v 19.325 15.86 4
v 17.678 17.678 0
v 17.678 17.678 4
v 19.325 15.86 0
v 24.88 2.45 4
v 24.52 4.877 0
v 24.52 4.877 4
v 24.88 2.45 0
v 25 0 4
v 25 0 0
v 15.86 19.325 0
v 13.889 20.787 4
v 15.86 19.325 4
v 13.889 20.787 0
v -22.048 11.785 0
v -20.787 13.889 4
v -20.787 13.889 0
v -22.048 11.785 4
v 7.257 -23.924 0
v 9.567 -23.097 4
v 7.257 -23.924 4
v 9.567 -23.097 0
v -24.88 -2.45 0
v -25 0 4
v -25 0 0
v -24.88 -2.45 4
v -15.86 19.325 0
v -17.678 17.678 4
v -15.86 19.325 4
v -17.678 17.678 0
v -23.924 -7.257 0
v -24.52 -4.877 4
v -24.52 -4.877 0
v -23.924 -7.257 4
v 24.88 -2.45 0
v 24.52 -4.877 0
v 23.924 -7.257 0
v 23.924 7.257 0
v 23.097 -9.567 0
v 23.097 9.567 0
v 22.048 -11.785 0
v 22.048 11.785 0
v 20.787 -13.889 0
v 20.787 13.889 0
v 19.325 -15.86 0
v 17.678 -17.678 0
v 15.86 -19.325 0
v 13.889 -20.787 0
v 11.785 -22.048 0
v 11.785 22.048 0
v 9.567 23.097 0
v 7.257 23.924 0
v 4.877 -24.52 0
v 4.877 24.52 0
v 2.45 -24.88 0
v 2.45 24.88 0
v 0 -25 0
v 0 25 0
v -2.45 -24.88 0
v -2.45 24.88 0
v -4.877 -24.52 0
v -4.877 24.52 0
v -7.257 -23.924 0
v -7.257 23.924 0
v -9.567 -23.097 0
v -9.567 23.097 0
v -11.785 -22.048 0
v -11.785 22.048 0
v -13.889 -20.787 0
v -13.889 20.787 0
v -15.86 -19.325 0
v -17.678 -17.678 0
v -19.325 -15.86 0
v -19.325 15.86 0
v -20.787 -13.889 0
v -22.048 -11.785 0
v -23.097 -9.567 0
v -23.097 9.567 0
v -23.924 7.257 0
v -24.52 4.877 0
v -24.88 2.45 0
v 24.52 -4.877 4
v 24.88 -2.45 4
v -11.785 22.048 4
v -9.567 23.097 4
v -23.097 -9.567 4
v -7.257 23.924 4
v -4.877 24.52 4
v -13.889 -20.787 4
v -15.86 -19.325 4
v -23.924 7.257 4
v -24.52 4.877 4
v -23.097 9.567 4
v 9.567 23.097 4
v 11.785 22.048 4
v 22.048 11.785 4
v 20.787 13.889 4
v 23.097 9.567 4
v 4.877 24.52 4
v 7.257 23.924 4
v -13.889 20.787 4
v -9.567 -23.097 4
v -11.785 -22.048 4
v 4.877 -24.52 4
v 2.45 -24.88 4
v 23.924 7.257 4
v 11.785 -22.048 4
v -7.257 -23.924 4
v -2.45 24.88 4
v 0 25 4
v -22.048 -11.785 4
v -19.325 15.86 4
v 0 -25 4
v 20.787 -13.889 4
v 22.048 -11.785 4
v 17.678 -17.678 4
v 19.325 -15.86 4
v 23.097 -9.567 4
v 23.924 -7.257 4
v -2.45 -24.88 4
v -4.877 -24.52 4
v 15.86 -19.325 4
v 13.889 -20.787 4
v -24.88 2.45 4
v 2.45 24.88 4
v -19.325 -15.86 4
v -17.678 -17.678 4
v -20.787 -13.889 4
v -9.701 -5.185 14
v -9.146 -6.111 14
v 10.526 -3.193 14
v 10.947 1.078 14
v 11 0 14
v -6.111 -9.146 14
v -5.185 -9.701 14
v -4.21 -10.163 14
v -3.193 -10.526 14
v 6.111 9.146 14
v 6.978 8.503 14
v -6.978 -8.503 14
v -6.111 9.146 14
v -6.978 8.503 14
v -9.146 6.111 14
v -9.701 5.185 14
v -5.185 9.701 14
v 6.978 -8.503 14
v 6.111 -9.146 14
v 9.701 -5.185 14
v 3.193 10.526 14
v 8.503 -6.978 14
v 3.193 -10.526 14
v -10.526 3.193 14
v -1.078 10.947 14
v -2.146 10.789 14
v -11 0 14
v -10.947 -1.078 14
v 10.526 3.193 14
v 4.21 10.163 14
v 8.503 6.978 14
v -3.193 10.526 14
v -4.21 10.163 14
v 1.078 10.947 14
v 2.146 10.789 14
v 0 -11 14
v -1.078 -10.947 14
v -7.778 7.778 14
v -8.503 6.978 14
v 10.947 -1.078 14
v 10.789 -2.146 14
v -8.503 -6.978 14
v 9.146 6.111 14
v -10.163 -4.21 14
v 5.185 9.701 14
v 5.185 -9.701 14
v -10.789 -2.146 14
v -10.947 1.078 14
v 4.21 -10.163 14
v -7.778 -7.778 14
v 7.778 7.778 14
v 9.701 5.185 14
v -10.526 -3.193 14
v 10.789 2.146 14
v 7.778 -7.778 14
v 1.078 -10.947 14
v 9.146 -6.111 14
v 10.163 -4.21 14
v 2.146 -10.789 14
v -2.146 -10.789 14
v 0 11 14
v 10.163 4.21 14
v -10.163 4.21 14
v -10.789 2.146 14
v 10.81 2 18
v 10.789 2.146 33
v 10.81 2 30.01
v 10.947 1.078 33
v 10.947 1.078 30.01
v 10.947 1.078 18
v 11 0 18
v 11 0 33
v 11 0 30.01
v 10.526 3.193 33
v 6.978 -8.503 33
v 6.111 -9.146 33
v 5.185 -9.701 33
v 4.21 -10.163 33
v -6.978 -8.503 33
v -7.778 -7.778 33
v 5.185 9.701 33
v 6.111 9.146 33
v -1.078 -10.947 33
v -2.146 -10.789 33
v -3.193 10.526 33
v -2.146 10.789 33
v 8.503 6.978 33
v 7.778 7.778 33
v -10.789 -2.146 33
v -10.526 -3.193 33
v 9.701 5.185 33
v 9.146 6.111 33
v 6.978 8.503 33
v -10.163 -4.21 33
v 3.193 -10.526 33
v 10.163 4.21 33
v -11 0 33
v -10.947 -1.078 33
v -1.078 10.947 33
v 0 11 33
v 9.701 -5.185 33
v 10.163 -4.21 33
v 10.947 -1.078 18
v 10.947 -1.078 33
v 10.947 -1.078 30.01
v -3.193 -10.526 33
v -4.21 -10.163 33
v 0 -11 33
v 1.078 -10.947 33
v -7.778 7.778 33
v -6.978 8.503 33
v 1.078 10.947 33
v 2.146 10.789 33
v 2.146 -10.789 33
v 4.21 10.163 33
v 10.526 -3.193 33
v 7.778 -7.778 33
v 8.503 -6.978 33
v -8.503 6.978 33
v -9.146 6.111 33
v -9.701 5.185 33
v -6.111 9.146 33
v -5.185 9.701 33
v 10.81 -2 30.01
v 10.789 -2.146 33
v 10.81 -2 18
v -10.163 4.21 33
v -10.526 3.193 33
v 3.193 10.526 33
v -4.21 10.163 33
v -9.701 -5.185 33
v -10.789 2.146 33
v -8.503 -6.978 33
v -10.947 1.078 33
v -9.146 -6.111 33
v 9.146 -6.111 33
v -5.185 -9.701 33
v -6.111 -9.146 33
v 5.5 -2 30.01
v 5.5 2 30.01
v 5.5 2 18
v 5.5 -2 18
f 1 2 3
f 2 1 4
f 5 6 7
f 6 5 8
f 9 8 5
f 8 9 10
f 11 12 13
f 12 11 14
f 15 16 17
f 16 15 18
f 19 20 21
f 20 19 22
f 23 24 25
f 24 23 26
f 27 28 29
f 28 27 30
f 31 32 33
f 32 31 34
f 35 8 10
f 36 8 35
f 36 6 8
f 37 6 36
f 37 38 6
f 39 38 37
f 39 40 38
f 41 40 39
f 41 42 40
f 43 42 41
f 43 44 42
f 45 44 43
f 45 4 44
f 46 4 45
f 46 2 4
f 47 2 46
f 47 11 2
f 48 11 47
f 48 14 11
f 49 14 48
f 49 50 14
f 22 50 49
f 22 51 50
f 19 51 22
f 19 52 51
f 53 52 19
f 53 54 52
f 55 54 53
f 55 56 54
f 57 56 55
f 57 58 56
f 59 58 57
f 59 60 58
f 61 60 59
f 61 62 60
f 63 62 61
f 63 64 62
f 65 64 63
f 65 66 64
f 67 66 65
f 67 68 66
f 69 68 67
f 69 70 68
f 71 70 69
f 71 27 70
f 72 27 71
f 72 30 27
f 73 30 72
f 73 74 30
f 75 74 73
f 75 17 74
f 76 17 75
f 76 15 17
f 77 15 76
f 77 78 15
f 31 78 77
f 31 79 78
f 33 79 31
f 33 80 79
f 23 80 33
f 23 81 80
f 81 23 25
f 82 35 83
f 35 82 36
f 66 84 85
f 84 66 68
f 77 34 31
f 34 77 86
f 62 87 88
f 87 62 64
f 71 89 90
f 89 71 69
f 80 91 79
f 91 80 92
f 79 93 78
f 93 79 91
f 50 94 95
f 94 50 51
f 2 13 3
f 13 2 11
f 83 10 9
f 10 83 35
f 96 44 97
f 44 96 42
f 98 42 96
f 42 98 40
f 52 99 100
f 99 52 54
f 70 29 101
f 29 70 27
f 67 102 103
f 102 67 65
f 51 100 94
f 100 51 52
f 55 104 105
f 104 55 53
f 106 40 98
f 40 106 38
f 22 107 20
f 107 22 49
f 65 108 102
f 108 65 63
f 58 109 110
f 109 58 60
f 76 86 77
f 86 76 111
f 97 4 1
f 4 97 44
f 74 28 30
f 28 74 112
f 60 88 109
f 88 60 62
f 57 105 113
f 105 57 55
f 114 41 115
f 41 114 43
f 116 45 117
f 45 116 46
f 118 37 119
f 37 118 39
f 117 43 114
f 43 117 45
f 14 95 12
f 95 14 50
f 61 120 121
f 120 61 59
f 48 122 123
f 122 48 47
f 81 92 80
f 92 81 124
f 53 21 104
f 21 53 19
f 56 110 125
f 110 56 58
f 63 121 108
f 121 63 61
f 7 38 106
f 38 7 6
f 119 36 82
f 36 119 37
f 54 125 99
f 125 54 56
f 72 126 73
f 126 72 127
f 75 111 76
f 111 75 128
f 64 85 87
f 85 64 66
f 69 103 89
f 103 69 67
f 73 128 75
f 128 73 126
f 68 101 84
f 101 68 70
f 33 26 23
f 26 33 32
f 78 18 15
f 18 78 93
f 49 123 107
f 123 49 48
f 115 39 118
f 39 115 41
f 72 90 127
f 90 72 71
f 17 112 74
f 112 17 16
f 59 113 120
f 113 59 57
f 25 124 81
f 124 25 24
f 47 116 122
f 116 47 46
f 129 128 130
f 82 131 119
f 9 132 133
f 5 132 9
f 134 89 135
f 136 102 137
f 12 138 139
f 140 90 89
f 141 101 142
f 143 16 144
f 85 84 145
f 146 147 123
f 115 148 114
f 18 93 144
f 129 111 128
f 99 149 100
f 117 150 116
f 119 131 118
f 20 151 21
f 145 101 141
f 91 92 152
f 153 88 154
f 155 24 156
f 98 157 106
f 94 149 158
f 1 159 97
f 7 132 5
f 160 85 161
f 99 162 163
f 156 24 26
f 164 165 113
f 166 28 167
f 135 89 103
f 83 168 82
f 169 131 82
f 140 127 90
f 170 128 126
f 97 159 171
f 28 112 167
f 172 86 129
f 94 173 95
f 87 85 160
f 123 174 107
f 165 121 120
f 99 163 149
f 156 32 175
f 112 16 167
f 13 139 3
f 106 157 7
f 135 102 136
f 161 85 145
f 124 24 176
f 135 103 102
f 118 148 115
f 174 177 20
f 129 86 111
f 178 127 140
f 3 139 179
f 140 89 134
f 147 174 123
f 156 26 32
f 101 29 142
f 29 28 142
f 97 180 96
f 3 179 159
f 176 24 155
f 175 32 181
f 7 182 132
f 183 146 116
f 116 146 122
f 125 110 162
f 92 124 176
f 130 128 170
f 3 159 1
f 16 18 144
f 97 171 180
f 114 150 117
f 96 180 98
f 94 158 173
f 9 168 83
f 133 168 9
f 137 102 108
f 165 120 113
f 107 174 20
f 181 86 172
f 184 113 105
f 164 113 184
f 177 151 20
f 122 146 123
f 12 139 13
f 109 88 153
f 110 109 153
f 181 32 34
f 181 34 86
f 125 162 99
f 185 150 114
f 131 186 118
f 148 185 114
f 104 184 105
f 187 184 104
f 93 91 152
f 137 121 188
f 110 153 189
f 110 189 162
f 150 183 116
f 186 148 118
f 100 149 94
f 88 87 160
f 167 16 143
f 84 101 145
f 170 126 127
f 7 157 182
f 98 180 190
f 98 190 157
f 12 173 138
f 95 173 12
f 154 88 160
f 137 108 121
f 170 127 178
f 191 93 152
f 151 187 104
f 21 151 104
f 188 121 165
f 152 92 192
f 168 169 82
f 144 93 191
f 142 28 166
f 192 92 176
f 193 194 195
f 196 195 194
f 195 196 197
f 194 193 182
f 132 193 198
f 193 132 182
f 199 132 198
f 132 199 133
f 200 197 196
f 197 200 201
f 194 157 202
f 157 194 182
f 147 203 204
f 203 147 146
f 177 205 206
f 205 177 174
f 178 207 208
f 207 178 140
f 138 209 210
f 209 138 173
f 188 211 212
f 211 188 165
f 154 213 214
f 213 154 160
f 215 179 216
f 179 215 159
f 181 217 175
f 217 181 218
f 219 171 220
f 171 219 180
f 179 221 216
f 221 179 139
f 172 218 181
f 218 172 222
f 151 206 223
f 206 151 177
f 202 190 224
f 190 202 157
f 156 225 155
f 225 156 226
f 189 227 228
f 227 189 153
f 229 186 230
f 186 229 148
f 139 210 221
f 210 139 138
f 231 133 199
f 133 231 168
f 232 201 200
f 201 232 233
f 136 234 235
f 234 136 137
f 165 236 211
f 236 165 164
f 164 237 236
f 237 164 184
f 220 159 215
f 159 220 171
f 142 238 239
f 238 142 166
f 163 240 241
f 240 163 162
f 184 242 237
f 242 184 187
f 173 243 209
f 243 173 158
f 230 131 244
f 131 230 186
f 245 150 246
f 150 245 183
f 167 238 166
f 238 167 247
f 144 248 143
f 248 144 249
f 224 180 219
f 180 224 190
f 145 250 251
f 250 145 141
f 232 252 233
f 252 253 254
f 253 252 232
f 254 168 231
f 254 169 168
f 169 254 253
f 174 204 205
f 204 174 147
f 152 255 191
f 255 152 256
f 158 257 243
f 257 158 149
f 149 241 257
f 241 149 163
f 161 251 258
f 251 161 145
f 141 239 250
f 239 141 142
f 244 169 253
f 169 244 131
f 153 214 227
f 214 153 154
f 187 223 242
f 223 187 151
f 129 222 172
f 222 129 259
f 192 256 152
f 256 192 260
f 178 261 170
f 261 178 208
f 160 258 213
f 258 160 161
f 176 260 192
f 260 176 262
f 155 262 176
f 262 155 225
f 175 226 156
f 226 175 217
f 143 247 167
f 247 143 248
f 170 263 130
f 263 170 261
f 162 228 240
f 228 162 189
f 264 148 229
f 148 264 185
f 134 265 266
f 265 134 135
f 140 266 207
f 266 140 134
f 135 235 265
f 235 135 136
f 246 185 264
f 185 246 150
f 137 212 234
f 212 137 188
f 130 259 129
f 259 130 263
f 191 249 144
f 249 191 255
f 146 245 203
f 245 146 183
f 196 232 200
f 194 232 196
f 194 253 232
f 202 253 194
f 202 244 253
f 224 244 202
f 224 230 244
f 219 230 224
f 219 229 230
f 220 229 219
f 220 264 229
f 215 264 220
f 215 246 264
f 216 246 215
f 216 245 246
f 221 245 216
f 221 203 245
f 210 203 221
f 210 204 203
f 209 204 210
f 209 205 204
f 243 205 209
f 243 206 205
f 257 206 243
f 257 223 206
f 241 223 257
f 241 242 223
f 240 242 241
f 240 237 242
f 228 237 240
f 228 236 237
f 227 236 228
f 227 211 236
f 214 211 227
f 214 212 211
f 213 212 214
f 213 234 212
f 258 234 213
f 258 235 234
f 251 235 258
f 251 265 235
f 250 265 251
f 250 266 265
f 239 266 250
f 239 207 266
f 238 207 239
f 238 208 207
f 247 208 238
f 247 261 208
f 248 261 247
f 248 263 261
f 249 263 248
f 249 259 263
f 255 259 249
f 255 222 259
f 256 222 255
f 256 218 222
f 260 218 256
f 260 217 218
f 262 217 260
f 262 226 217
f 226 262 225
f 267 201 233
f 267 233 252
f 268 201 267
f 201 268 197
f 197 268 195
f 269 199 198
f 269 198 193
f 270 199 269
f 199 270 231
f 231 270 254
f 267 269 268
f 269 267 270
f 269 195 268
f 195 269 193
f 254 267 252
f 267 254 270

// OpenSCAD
// Dimensions (mm) - measured with calipers
base_dia = 50;
base_h = 4;
cone_top_dia = 50;
cone_bot_dia = 22;
cone_h = 10; // z=4 to z=14
col_dia = 22;
col_h = 19; // z=14 to z=33
seat_dia = 11;
seat_h = 10; // z=33 down to z=23
tip_dia = 3;
tip_z = 6;
window_w = 4;
window_z1 = 18;
window_z2 = 30;

$fn = 64;

// Solid definition
module stand_solid() {
    // Base disc
    translate([0, 0, 0])
        cylinder(h = base_h, r = base_dia / 2, center = false);

    // Cone
    translate([0, 0, base_h])
        cylinder(h = cone_h, r1 = cone_top_dia / 2, r2 = cone_bot_dia / 2, center = false);

    // Column
    translate([0, 0, base_h + cone_h])
        cylinder(h = col_h, r = col_dia / 2, center = false);

    // Tube seat (cylindrical part)
    // From z=33 down to z=23
    translate([0, 0, base_h + cone_h + col_h - seat_h])
        cylinder(h = seat_h, r = seat_dia / 2, center = false);

    // Tube seat (conical tip part)
    // From z=23 down to z=6, diameter goes from 11 to 3
    cone_seat_h = 23 - tip_z; // 17 mm
    translate([0, 0, tip_z])
        cylinder(h = cone_seat_h, r1 = tip_dia / 2, r2 = seat_dia / 2, center = false);
}

// Final assembly
difference() {
    stand_solid();
    
    // Viewing window cut
    // Cut through the column wall on +X side
    // Window is 4 mm wide in Y, from z=18 to z=30
    // It goes from the seat (inner radius) to the outside (outer radius)
    // Inner radius = seat_dia/2 = 5.5 mm
    // Outer radius = col_dia/2 = 11 mm
    // So the cut extends from x = 5.5 to x = 11 (and beyond to ensure clean cut)
    // Centered in Y at 0, width 4 mm means Y from -2 to +2
    
    translate([seat_dia / 2, -window_w / 2, window_z1])
        cube([col_dia / 2 - seat_dia / 2 + 1, window_w, window_z2 - window_z1 + 0.01]);
}
